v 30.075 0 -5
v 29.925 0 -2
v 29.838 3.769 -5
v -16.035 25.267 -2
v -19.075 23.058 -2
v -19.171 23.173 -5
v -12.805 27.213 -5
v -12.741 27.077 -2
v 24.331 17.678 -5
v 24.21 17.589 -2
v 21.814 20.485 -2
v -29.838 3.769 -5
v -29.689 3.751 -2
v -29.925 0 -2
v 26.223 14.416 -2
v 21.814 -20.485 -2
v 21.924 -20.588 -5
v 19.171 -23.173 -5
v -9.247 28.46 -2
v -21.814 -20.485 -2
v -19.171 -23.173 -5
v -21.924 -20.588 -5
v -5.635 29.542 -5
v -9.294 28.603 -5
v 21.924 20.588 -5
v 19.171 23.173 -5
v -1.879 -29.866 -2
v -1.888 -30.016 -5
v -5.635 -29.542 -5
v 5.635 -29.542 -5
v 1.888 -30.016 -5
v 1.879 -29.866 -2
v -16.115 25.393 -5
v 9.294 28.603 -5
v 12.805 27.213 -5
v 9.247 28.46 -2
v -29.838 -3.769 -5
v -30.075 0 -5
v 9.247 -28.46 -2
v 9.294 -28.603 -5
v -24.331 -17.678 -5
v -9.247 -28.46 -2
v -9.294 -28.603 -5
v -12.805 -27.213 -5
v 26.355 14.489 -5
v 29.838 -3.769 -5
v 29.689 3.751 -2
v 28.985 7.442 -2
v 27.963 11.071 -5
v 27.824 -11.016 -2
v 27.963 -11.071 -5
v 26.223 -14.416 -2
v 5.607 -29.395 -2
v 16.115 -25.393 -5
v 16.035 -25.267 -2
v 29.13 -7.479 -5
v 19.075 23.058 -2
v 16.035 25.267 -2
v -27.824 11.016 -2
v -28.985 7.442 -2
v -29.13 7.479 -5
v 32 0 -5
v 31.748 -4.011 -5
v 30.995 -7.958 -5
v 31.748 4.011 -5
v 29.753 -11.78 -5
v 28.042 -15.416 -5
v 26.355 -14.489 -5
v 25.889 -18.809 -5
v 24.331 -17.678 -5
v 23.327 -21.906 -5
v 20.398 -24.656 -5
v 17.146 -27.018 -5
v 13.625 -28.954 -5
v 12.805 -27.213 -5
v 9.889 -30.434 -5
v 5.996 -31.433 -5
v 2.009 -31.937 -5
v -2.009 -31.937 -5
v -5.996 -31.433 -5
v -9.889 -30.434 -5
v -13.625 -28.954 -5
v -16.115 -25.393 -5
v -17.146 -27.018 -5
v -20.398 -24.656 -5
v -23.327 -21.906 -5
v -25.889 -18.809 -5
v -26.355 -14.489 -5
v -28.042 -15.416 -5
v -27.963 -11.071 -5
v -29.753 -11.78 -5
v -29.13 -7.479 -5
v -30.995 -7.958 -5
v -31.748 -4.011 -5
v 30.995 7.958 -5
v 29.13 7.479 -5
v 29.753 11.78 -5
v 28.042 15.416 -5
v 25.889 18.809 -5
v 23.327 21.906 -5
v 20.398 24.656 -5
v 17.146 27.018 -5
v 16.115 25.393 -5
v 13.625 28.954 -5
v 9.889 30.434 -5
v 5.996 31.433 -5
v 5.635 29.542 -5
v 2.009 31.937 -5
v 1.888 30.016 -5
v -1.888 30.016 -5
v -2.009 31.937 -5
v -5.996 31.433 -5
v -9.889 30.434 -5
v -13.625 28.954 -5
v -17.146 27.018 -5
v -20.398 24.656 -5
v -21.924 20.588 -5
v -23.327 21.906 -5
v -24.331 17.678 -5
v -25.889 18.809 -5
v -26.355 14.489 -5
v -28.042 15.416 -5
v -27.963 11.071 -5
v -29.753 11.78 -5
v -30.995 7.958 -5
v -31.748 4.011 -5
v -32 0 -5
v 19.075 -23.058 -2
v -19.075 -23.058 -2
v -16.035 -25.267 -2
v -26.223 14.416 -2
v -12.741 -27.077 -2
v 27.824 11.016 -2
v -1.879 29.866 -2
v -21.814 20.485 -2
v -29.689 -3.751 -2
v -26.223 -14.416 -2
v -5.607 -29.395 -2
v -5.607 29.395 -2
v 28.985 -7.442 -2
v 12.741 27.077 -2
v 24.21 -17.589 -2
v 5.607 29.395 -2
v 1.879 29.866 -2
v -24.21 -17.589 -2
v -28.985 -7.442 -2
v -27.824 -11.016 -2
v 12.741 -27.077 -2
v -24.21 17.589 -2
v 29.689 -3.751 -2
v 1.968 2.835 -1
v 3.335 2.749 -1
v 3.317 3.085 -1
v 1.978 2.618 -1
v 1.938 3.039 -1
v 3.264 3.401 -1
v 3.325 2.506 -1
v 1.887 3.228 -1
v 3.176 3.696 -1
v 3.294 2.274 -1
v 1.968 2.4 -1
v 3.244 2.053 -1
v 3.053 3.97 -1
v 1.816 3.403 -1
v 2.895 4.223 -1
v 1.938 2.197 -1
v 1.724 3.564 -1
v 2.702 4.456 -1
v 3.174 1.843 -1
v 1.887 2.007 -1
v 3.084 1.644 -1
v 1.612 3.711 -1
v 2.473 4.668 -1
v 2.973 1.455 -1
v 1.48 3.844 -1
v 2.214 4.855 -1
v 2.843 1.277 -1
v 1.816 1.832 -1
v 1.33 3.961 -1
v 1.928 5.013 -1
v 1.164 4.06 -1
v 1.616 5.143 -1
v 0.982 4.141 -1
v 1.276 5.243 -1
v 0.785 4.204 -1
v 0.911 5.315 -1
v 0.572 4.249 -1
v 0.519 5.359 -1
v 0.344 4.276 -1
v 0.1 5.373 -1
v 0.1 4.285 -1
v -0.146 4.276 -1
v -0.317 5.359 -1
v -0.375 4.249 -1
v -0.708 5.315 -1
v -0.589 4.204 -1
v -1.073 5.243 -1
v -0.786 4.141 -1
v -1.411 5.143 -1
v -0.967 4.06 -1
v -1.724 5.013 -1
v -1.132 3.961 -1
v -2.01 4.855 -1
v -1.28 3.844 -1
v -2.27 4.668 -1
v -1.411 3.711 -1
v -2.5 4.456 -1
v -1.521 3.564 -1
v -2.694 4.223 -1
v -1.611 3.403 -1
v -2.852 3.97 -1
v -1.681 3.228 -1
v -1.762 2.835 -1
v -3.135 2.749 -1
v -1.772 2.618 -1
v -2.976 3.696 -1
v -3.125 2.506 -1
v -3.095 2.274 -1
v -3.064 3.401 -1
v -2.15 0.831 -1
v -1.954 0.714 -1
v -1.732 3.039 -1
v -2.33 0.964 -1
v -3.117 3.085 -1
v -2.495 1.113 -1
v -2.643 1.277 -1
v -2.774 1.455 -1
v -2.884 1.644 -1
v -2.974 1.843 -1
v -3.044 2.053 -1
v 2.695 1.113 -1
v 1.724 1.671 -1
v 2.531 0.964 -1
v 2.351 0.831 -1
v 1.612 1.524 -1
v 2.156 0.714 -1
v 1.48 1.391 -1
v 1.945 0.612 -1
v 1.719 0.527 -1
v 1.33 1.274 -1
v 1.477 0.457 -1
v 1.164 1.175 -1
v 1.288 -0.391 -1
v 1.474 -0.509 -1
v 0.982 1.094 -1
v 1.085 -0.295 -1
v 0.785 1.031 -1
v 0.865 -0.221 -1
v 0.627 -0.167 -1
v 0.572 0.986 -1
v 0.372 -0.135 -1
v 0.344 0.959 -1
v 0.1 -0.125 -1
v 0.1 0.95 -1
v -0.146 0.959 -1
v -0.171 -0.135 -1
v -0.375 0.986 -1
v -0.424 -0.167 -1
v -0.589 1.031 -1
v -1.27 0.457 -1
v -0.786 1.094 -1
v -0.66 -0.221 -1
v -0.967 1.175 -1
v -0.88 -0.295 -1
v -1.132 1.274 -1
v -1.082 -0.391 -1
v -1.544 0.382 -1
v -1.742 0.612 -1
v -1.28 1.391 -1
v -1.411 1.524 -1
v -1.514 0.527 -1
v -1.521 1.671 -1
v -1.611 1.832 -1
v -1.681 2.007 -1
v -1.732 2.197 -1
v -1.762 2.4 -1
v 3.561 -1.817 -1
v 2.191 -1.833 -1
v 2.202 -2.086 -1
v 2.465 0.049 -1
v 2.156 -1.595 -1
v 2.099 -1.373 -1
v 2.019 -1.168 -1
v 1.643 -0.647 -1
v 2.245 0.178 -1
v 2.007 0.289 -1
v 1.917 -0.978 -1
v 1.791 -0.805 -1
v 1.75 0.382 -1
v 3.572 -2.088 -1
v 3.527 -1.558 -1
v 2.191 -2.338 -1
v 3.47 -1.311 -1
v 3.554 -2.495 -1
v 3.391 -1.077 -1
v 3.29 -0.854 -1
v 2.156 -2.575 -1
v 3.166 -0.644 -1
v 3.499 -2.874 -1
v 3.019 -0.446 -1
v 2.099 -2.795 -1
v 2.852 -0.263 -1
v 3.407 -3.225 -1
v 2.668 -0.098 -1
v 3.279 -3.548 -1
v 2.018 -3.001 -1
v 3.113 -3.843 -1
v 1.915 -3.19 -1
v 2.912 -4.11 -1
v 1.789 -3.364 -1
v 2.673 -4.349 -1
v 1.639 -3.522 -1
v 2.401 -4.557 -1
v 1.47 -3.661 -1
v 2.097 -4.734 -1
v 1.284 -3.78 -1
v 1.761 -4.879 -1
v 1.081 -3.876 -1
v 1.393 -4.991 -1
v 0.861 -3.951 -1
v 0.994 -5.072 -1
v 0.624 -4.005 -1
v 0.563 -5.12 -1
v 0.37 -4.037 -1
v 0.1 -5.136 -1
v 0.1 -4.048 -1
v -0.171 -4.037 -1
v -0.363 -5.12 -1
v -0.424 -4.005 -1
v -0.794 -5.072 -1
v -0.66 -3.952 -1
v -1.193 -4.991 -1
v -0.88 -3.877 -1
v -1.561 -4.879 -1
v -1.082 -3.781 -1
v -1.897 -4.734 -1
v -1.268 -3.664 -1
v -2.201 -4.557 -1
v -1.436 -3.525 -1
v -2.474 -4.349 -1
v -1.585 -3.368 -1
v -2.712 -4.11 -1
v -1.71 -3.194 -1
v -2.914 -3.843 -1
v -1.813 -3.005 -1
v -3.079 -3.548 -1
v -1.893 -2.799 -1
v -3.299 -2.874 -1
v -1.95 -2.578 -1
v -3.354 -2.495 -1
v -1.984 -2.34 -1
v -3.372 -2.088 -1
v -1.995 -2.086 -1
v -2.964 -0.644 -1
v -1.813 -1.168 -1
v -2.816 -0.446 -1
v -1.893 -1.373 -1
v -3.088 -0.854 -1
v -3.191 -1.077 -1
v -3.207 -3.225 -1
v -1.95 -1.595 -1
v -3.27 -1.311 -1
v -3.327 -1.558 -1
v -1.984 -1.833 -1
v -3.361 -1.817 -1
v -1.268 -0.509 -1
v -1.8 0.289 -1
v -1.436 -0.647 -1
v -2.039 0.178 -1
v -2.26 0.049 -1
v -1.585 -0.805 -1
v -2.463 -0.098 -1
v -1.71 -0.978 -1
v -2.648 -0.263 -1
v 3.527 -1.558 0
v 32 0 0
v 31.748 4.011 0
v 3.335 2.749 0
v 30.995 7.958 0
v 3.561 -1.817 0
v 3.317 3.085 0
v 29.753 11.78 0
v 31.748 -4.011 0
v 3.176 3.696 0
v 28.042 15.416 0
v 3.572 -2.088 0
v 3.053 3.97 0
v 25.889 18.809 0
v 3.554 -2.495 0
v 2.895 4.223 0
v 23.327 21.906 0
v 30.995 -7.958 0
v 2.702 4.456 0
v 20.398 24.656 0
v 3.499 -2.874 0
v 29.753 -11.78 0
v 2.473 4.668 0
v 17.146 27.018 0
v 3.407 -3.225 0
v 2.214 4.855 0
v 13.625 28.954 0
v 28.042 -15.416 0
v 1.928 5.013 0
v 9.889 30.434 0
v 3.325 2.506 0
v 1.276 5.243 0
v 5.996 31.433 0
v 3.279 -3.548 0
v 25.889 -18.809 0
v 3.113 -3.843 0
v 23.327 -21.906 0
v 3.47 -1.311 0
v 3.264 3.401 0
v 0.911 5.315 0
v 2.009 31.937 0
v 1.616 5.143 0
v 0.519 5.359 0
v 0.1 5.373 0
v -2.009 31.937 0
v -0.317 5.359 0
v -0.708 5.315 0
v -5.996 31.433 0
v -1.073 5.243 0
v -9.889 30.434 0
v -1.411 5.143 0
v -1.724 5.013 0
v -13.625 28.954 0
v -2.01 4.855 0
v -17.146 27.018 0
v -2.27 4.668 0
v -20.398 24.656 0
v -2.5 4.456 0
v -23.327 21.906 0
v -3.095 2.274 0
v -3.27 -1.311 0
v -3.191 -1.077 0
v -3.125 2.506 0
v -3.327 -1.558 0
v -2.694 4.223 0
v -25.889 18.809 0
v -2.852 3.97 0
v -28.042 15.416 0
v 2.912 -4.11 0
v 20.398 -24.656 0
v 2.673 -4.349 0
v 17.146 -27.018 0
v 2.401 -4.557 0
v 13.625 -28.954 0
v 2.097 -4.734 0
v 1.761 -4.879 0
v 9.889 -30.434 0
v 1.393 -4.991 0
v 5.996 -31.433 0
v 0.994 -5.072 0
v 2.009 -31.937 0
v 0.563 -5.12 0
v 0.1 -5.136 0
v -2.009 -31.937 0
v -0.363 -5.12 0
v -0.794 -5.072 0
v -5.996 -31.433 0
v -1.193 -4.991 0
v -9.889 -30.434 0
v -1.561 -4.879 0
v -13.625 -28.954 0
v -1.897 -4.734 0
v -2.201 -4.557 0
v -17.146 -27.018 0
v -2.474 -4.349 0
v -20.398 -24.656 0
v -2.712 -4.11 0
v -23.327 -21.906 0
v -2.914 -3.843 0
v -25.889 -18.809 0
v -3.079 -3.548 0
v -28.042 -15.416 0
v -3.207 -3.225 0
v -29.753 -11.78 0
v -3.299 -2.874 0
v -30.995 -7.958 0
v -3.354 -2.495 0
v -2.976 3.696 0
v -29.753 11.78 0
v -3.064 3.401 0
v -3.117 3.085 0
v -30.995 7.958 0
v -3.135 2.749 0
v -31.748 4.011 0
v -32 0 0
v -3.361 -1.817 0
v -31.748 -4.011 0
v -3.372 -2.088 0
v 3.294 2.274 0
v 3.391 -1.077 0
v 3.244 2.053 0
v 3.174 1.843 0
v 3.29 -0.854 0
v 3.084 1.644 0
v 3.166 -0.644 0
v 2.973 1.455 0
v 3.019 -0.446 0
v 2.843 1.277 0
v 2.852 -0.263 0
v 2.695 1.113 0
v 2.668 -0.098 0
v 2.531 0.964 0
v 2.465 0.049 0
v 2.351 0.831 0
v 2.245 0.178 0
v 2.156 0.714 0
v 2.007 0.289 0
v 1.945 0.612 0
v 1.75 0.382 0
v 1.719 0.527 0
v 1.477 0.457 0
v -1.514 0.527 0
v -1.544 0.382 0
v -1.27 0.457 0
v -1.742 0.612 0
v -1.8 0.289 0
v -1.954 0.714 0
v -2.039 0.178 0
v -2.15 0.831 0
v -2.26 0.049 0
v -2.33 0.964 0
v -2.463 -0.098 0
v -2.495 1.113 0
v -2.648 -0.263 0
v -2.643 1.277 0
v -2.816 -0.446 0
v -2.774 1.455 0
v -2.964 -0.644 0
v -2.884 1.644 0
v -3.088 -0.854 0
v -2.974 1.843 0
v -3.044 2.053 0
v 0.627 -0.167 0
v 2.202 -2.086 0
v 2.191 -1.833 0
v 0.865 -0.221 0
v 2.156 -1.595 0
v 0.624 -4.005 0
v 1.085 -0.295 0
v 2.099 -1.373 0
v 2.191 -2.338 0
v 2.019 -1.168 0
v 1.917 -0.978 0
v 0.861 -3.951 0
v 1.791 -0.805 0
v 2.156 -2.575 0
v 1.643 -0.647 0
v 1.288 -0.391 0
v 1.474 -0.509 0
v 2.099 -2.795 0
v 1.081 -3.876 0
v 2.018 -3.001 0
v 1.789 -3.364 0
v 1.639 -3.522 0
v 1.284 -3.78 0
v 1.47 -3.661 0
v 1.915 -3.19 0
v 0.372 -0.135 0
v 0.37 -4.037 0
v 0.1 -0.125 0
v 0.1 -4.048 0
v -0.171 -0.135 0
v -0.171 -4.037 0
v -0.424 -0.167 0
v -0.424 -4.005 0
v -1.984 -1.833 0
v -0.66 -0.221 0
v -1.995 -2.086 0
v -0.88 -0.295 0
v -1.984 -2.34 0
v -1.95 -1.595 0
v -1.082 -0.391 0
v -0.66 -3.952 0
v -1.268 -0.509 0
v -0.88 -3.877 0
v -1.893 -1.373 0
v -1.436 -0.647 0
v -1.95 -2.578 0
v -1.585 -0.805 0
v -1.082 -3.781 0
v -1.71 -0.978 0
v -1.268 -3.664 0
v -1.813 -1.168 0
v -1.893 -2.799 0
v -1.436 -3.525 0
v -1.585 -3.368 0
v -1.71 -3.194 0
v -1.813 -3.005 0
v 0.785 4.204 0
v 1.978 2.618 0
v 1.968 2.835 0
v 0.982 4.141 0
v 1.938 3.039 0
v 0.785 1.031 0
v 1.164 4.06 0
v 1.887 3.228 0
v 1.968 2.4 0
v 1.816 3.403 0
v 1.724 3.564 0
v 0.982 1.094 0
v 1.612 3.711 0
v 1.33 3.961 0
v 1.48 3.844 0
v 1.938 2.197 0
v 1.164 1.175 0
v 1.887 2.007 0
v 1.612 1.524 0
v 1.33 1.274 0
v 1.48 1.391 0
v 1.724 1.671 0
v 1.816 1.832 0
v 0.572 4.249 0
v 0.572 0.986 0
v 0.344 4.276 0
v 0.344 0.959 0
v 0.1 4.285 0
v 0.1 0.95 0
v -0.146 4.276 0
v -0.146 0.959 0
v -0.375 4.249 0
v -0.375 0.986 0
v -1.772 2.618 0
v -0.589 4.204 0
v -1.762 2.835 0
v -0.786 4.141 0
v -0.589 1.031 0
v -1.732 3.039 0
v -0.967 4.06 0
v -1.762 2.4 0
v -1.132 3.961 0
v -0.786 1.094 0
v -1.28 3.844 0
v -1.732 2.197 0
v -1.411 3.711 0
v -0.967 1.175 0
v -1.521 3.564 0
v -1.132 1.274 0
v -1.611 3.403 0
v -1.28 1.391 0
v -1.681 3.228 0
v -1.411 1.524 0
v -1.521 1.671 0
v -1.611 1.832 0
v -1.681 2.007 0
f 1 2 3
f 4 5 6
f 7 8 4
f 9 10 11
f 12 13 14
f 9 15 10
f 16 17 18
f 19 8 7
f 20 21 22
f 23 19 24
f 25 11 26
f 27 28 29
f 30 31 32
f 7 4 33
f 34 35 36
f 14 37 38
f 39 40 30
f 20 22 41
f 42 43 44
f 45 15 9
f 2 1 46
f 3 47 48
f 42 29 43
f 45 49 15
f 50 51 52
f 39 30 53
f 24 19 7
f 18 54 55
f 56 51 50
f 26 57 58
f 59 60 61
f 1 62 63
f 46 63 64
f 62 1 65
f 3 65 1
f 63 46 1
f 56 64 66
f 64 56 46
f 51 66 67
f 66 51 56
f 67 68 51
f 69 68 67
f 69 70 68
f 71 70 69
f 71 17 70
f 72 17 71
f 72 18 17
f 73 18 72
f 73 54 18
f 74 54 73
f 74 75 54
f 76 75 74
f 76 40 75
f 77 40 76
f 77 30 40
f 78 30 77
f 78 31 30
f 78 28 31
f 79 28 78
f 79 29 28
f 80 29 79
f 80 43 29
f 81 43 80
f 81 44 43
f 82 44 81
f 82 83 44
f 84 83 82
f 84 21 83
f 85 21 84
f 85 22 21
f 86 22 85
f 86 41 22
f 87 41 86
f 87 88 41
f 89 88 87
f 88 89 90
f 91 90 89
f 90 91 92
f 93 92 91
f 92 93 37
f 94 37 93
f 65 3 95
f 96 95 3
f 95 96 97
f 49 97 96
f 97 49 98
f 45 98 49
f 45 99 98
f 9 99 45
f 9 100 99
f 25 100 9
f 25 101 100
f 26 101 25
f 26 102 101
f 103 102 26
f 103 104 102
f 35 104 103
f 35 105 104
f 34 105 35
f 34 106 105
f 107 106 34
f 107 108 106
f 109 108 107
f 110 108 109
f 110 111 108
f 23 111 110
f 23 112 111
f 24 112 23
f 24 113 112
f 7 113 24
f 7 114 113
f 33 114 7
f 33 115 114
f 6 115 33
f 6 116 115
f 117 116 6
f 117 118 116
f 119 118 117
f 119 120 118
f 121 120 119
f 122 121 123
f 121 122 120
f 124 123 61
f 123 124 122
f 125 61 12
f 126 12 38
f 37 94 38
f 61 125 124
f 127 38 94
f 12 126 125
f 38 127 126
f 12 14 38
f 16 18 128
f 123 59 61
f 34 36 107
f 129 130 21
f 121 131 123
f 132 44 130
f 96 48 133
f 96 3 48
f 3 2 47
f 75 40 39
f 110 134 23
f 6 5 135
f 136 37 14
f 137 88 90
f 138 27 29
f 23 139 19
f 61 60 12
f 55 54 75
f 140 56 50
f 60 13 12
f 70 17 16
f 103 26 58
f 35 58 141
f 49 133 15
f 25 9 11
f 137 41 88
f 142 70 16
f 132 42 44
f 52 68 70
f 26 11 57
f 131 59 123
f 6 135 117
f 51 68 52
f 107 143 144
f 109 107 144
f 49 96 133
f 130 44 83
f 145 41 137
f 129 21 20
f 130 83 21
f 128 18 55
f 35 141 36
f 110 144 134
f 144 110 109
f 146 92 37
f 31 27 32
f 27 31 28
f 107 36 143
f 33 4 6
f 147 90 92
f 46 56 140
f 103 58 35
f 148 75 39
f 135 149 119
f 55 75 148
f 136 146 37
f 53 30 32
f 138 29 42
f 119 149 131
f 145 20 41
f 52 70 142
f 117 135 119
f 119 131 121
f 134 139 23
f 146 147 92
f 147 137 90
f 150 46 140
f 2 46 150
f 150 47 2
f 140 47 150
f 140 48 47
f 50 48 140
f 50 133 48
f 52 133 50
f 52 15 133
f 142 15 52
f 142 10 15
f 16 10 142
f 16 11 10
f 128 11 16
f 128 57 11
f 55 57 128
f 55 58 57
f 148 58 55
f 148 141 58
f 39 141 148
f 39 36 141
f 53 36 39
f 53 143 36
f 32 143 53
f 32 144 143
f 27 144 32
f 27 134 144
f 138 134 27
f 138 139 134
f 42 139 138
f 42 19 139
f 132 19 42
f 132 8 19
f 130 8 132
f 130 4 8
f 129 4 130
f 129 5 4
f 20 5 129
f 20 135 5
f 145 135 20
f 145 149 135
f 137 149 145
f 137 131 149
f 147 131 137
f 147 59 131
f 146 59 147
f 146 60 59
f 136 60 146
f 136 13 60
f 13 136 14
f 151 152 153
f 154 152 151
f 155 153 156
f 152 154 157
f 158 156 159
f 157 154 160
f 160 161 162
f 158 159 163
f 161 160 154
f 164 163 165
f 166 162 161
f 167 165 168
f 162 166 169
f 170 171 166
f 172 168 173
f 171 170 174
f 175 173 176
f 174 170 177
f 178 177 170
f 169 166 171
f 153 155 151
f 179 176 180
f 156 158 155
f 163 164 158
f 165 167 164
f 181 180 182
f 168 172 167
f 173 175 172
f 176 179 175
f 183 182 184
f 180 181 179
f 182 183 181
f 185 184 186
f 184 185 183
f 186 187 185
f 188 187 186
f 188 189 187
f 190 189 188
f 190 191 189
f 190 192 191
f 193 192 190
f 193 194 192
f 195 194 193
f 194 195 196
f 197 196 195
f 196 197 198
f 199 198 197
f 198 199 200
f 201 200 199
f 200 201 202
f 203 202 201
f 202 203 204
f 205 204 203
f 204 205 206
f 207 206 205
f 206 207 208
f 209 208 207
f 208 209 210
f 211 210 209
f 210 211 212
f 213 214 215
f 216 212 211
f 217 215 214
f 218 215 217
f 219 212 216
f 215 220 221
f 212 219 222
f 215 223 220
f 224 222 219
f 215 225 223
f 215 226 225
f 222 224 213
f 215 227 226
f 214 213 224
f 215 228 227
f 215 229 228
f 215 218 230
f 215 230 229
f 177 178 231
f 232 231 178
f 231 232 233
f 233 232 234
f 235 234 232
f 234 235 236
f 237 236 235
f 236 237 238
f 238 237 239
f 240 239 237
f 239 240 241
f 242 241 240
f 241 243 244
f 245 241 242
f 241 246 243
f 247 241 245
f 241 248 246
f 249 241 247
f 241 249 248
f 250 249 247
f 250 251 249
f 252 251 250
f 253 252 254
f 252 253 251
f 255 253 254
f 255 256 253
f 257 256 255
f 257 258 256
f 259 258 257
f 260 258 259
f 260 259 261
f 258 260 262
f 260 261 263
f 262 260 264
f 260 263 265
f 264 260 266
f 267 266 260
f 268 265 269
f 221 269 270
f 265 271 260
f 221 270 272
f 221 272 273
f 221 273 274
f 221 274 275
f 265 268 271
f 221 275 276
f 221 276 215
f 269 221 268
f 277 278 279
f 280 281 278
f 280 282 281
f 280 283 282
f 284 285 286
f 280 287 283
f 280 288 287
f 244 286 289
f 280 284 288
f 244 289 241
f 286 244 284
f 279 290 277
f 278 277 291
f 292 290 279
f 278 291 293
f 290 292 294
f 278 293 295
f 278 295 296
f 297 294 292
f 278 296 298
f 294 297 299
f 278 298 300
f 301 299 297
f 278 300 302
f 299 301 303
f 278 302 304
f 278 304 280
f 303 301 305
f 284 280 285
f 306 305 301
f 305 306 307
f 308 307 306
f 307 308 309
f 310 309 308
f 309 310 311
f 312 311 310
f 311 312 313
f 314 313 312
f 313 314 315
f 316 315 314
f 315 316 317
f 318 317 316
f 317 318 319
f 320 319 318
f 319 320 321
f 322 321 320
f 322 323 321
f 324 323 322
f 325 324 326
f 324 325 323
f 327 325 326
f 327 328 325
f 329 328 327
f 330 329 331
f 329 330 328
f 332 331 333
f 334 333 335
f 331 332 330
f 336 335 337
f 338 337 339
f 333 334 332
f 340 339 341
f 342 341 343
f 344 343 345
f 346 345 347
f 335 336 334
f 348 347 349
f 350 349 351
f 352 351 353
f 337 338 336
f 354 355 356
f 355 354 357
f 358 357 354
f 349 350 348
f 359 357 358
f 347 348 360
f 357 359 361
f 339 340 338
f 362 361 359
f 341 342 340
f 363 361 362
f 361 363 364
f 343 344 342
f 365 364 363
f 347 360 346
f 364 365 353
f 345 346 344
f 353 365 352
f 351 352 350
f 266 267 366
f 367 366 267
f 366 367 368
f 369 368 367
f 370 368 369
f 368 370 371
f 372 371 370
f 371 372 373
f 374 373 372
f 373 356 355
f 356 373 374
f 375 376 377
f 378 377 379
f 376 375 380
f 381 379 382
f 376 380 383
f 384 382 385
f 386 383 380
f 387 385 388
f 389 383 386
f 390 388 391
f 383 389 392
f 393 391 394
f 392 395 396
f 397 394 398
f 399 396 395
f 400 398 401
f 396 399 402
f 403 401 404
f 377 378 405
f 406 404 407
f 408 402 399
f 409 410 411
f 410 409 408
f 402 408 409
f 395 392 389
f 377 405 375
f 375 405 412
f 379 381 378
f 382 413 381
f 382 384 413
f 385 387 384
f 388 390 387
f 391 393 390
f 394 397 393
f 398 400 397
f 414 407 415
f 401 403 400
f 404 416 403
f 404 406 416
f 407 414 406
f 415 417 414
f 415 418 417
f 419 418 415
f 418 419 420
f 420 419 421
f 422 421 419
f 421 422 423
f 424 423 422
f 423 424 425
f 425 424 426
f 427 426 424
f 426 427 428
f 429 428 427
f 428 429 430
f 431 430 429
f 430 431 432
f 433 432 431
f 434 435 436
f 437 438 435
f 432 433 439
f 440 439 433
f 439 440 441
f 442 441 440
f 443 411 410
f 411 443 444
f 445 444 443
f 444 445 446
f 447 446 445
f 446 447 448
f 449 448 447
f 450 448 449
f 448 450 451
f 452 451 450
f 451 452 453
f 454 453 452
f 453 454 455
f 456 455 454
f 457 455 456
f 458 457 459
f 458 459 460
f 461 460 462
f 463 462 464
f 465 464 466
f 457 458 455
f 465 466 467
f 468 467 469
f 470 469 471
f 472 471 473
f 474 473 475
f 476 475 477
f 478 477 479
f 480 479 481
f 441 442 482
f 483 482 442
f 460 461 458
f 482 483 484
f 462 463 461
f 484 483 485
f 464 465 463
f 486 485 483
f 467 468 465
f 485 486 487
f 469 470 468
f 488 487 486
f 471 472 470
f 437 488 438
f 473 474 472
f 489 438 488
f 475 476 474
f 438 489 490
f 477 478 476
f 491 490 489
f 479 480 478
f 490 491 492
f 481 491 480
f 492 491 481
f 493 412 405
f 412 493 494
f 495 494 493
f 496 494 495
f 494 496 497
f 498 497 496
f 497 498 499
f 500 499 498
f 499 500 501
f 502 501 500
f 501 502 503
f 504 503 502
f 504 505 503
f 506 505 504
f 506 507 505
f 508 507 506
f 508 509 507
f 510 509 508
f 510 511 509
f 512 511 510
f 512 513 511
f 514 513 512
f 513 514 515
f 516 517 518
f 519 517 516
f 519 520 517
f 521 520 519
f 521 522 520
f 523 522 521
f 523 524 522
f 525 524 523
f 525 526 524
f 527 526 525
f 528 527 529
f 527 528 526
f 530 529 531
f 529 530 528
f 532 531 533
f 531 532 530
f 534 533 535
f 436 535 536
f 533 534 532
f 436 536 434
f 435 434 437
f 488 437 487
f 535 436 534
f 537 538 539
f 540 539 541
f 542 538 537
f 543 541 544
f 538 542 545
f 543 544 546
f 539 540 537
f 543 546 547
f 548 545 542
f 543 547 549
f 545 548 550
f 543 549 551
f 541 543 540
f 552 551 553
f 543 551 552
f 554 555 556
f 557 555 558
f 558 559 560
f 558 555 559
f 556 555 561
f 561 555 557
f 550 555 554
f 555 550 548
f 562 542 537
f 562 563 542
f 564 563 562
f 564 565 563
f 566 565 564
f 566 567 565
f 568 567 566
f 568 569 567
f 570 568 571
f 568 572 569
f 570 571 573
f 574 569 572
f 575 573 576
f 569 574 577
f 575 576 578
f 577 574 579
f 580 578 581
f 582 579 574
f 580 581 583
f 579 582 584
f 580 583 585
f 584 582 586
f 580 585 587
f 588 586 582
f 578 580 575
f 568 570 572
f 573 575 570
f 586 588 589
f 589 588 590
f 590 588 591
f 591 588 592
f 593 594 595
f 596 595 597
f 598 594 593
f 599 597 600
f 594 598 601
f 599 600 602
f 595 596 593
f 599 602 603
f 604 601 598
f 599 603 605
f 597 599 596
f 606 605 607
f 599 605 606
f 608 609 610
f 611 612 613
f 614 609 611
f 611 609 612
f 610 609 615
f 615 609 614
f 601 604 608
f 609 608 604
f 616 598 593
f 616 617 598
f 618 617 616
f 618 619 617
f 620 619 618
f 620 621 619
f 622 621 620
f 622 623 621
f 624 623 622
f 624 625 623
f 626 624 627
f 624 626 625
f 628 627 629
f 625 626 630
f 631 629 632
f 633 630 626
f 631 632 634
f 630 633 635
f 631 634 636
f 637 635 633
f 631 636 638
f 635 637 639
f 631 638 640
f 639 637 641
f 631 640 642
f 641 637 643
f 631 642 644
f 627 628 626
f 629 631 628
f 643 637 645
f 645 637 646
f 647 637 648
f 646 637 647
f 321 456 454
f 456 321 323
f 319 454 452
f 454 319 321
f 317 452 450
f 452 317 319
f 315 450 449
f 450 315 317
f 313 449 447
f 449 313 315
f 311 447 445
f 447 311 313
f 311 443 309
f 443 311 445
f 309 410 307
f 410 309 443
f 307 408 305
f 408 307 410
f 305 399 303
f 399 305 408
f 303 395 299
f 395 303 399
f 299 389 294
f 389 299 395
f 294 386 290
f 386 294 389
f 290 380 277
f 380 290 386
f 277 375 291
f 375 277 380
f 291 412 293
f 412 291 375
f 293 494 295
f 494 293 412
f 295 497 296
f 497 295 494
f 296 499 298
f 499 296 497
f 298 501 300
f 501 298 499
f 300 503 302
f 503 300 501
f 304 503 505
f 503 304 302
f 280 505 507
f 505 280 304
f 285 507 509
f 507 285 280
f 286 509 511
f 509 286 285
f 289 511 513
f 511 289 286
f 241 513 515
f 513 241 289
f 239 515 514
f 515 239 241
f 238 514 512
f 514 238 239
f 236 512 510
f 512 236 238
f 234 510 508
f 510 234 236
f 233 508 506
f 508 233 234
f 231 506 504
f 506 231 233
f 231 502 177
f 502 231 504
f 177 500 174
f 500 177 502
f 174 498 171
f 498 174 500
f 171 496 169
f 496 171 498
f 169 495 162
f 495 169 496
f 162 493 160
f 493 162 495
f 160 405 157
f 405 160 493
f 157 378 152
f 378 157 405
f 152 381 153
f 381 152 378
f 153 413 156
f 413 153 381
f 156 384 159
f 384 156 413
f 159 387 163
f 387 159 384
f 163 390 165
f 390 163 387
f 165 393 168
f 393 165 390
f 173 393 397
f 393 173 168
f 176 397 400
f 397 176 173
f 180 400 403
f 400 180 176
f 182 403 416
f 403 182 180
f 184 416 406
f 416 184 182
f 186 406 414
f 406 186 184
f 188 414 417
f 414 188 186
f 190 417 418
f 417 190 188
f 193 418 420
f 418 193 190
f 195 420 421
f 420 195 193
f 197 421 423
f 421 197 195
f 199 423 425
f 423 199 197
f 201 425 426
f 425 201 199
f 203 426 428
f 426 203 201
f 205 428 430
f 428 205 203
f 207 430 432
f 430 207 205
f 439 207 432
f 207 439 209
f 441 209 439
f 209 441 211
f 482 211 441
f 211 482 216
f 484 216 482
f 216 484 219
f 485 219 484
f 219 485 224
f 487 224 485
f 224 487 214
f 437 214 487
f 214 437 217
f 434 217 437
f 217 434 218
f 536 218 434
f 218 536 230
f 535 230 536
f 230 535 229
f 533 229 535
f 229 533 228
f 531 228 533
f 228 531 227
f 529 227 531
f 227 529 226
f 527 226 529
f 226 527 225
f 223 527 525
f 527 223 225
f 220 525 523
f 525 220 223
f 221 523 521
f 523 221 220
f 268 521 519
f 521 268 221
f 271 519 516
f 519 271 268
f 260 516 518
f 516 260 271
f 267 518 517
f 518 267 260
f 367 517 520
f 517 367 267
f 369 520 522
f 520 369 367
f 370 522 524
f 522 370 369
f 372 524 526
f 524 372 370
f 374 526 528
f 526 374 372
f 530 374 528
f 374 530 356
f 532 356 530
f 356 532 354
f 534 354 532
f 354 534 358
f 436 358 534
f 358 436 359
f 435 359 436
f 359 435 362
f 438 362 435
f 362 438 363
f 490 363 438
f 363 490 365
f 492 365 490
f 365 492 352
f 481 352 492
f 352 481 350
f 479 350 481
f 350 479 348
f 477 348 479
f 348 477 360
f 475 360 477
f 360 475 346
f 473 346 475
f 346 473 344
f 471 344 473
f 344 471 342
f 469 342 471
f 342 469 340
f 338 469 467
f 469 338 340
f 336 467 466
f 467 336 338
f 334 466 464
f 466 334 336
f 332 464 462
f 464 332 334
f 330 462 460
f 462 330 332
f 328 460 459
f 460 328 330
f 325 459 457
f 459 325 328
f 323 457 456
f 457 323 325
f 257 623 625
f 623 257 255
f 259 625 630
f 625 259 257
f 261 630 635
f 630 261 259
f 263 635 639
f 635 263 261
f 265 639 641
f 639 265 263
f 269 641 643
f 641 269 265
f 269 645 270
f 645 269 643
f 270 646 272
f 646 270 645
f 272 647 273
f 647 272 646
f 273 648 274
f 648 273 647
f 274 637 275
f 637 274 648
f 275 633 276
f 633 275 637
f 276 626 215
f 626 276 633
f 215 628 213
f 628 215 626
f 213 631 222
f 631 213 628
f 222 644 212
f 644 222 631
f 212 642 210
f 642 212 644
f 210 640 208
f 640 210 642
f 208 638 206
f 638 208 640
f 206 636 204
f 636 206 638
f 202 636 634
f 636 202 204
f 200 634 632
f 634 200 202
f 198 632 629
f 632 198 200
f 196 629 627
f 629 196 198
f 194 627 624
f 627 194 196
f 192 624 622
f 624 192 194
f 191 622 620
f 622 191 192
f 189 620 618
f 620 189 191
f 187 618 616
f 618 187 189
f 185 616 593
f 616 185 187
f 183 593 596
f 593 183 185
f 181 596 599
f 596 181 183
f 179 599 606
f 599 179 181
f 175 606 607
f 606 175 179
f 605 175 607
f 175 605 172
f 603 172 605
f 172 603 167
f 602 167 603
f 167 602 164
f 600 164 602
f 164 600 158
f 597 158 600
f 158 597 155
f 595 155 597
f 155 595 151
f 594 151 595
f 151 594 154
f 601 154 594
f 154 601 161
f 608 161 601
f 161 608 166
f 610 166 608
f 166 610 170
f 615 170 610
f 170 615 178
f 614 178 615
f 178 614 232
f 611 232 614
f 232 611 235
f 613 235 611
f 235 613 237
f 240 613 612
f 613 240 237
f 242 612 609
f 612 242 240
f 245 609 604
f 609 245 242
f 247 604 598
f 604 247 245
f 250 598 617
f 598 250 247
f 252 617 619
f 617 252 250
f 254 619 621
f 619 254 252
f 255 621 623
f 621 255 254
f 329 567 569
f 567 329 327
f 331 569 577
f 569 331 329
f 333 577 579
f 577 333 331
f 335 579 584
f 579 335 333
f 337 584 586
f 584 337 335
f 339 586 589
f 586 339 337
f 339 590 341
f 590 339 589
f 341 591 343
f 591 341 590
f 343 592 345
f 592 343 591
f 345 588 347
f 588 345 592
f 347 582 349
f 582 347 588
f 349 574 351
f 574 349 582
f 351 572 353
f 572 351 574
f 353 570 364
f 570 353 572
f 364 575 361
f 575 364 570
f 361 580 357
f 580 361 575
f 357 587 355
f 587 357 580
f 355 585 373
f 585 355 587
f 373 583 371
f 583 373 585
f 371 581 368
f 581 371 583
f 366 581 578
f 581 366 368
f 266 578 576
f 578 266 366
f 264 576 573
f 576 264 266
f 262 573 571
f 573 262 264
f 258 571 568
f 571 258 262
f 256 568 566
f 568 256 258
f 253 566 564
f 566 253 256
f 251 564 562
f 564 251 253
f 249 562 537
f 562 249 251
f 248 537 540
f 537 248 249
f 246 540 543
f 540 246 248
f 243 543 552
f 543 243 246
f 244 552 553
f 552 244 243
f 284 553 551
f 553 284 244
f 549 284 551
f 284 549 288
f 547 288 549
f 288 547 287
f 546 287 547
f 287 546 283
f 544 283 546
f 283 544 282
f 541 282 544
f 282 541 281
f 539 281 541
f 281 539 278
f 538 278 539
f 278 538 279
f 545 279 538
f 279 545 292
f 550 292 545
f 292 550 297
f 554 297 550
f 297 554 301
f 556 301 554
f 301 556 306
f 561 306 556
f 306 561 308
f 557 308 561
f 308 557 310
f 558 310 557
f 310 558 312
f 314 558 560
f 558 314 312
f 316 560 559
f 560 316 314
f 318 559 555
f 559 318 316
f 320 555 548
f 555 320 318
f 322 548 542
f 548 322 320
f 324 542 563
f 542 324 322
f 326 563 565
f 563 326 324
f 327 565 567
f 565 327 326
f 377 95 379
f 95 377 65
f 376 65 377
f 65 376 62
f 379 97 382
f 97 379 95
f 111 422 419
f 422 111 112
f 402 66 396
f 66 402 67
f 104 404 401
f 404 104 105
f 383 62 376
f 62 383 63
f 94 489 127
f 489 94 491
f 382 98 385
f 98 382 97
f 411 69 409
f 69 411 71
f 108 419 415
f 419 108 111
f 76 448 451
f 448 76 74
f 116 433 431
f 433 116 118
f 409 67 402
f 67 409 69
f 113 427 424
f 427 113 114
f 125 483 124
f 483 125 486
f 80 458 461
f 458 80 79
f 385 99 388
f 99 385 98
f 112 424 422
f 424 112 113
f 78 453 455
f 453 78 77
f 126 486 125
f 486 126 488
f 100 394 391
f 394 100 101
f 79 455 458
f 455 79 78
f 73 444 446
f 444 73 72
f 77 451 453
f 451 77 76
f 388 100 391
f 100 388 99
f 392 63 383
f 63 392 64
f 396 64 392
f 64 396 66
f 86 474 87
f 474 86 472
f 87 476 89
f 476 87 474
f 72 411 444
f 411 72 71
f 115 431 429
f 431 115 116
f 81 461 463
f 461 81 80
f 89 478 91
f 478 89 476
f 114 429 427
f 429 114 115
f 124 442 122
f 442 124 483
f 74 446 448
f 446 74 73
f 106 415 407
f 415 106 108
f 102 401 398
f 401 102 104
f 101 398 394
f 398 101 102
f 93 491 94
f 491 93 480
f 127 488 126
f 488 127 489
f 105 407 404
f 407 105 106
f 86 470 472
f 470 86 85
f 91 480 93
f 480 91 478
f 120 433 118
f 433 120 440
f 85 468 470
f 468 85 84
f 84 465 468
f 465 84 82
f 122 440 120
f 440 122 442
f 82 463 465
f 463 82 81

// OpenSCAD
$fn = 50;

difference() {
	union() {
		translate(v = [0, 0, -5.0]) {
			cylinder(h = 5, r = 32.0);
		}
	}
	union() {
		#translate(v = [0, 0, -5.0]) {
			cylinder(h = 3, r1 = 30.075, r2 = 29.925);
		}
		translate(v = [0, 0, -1]) {
			linear_extrude(height = 1) {
				text(font = "Impact", halign = "center", size = 10, text = "8", valign = "center");
			}
		}
	}
}
